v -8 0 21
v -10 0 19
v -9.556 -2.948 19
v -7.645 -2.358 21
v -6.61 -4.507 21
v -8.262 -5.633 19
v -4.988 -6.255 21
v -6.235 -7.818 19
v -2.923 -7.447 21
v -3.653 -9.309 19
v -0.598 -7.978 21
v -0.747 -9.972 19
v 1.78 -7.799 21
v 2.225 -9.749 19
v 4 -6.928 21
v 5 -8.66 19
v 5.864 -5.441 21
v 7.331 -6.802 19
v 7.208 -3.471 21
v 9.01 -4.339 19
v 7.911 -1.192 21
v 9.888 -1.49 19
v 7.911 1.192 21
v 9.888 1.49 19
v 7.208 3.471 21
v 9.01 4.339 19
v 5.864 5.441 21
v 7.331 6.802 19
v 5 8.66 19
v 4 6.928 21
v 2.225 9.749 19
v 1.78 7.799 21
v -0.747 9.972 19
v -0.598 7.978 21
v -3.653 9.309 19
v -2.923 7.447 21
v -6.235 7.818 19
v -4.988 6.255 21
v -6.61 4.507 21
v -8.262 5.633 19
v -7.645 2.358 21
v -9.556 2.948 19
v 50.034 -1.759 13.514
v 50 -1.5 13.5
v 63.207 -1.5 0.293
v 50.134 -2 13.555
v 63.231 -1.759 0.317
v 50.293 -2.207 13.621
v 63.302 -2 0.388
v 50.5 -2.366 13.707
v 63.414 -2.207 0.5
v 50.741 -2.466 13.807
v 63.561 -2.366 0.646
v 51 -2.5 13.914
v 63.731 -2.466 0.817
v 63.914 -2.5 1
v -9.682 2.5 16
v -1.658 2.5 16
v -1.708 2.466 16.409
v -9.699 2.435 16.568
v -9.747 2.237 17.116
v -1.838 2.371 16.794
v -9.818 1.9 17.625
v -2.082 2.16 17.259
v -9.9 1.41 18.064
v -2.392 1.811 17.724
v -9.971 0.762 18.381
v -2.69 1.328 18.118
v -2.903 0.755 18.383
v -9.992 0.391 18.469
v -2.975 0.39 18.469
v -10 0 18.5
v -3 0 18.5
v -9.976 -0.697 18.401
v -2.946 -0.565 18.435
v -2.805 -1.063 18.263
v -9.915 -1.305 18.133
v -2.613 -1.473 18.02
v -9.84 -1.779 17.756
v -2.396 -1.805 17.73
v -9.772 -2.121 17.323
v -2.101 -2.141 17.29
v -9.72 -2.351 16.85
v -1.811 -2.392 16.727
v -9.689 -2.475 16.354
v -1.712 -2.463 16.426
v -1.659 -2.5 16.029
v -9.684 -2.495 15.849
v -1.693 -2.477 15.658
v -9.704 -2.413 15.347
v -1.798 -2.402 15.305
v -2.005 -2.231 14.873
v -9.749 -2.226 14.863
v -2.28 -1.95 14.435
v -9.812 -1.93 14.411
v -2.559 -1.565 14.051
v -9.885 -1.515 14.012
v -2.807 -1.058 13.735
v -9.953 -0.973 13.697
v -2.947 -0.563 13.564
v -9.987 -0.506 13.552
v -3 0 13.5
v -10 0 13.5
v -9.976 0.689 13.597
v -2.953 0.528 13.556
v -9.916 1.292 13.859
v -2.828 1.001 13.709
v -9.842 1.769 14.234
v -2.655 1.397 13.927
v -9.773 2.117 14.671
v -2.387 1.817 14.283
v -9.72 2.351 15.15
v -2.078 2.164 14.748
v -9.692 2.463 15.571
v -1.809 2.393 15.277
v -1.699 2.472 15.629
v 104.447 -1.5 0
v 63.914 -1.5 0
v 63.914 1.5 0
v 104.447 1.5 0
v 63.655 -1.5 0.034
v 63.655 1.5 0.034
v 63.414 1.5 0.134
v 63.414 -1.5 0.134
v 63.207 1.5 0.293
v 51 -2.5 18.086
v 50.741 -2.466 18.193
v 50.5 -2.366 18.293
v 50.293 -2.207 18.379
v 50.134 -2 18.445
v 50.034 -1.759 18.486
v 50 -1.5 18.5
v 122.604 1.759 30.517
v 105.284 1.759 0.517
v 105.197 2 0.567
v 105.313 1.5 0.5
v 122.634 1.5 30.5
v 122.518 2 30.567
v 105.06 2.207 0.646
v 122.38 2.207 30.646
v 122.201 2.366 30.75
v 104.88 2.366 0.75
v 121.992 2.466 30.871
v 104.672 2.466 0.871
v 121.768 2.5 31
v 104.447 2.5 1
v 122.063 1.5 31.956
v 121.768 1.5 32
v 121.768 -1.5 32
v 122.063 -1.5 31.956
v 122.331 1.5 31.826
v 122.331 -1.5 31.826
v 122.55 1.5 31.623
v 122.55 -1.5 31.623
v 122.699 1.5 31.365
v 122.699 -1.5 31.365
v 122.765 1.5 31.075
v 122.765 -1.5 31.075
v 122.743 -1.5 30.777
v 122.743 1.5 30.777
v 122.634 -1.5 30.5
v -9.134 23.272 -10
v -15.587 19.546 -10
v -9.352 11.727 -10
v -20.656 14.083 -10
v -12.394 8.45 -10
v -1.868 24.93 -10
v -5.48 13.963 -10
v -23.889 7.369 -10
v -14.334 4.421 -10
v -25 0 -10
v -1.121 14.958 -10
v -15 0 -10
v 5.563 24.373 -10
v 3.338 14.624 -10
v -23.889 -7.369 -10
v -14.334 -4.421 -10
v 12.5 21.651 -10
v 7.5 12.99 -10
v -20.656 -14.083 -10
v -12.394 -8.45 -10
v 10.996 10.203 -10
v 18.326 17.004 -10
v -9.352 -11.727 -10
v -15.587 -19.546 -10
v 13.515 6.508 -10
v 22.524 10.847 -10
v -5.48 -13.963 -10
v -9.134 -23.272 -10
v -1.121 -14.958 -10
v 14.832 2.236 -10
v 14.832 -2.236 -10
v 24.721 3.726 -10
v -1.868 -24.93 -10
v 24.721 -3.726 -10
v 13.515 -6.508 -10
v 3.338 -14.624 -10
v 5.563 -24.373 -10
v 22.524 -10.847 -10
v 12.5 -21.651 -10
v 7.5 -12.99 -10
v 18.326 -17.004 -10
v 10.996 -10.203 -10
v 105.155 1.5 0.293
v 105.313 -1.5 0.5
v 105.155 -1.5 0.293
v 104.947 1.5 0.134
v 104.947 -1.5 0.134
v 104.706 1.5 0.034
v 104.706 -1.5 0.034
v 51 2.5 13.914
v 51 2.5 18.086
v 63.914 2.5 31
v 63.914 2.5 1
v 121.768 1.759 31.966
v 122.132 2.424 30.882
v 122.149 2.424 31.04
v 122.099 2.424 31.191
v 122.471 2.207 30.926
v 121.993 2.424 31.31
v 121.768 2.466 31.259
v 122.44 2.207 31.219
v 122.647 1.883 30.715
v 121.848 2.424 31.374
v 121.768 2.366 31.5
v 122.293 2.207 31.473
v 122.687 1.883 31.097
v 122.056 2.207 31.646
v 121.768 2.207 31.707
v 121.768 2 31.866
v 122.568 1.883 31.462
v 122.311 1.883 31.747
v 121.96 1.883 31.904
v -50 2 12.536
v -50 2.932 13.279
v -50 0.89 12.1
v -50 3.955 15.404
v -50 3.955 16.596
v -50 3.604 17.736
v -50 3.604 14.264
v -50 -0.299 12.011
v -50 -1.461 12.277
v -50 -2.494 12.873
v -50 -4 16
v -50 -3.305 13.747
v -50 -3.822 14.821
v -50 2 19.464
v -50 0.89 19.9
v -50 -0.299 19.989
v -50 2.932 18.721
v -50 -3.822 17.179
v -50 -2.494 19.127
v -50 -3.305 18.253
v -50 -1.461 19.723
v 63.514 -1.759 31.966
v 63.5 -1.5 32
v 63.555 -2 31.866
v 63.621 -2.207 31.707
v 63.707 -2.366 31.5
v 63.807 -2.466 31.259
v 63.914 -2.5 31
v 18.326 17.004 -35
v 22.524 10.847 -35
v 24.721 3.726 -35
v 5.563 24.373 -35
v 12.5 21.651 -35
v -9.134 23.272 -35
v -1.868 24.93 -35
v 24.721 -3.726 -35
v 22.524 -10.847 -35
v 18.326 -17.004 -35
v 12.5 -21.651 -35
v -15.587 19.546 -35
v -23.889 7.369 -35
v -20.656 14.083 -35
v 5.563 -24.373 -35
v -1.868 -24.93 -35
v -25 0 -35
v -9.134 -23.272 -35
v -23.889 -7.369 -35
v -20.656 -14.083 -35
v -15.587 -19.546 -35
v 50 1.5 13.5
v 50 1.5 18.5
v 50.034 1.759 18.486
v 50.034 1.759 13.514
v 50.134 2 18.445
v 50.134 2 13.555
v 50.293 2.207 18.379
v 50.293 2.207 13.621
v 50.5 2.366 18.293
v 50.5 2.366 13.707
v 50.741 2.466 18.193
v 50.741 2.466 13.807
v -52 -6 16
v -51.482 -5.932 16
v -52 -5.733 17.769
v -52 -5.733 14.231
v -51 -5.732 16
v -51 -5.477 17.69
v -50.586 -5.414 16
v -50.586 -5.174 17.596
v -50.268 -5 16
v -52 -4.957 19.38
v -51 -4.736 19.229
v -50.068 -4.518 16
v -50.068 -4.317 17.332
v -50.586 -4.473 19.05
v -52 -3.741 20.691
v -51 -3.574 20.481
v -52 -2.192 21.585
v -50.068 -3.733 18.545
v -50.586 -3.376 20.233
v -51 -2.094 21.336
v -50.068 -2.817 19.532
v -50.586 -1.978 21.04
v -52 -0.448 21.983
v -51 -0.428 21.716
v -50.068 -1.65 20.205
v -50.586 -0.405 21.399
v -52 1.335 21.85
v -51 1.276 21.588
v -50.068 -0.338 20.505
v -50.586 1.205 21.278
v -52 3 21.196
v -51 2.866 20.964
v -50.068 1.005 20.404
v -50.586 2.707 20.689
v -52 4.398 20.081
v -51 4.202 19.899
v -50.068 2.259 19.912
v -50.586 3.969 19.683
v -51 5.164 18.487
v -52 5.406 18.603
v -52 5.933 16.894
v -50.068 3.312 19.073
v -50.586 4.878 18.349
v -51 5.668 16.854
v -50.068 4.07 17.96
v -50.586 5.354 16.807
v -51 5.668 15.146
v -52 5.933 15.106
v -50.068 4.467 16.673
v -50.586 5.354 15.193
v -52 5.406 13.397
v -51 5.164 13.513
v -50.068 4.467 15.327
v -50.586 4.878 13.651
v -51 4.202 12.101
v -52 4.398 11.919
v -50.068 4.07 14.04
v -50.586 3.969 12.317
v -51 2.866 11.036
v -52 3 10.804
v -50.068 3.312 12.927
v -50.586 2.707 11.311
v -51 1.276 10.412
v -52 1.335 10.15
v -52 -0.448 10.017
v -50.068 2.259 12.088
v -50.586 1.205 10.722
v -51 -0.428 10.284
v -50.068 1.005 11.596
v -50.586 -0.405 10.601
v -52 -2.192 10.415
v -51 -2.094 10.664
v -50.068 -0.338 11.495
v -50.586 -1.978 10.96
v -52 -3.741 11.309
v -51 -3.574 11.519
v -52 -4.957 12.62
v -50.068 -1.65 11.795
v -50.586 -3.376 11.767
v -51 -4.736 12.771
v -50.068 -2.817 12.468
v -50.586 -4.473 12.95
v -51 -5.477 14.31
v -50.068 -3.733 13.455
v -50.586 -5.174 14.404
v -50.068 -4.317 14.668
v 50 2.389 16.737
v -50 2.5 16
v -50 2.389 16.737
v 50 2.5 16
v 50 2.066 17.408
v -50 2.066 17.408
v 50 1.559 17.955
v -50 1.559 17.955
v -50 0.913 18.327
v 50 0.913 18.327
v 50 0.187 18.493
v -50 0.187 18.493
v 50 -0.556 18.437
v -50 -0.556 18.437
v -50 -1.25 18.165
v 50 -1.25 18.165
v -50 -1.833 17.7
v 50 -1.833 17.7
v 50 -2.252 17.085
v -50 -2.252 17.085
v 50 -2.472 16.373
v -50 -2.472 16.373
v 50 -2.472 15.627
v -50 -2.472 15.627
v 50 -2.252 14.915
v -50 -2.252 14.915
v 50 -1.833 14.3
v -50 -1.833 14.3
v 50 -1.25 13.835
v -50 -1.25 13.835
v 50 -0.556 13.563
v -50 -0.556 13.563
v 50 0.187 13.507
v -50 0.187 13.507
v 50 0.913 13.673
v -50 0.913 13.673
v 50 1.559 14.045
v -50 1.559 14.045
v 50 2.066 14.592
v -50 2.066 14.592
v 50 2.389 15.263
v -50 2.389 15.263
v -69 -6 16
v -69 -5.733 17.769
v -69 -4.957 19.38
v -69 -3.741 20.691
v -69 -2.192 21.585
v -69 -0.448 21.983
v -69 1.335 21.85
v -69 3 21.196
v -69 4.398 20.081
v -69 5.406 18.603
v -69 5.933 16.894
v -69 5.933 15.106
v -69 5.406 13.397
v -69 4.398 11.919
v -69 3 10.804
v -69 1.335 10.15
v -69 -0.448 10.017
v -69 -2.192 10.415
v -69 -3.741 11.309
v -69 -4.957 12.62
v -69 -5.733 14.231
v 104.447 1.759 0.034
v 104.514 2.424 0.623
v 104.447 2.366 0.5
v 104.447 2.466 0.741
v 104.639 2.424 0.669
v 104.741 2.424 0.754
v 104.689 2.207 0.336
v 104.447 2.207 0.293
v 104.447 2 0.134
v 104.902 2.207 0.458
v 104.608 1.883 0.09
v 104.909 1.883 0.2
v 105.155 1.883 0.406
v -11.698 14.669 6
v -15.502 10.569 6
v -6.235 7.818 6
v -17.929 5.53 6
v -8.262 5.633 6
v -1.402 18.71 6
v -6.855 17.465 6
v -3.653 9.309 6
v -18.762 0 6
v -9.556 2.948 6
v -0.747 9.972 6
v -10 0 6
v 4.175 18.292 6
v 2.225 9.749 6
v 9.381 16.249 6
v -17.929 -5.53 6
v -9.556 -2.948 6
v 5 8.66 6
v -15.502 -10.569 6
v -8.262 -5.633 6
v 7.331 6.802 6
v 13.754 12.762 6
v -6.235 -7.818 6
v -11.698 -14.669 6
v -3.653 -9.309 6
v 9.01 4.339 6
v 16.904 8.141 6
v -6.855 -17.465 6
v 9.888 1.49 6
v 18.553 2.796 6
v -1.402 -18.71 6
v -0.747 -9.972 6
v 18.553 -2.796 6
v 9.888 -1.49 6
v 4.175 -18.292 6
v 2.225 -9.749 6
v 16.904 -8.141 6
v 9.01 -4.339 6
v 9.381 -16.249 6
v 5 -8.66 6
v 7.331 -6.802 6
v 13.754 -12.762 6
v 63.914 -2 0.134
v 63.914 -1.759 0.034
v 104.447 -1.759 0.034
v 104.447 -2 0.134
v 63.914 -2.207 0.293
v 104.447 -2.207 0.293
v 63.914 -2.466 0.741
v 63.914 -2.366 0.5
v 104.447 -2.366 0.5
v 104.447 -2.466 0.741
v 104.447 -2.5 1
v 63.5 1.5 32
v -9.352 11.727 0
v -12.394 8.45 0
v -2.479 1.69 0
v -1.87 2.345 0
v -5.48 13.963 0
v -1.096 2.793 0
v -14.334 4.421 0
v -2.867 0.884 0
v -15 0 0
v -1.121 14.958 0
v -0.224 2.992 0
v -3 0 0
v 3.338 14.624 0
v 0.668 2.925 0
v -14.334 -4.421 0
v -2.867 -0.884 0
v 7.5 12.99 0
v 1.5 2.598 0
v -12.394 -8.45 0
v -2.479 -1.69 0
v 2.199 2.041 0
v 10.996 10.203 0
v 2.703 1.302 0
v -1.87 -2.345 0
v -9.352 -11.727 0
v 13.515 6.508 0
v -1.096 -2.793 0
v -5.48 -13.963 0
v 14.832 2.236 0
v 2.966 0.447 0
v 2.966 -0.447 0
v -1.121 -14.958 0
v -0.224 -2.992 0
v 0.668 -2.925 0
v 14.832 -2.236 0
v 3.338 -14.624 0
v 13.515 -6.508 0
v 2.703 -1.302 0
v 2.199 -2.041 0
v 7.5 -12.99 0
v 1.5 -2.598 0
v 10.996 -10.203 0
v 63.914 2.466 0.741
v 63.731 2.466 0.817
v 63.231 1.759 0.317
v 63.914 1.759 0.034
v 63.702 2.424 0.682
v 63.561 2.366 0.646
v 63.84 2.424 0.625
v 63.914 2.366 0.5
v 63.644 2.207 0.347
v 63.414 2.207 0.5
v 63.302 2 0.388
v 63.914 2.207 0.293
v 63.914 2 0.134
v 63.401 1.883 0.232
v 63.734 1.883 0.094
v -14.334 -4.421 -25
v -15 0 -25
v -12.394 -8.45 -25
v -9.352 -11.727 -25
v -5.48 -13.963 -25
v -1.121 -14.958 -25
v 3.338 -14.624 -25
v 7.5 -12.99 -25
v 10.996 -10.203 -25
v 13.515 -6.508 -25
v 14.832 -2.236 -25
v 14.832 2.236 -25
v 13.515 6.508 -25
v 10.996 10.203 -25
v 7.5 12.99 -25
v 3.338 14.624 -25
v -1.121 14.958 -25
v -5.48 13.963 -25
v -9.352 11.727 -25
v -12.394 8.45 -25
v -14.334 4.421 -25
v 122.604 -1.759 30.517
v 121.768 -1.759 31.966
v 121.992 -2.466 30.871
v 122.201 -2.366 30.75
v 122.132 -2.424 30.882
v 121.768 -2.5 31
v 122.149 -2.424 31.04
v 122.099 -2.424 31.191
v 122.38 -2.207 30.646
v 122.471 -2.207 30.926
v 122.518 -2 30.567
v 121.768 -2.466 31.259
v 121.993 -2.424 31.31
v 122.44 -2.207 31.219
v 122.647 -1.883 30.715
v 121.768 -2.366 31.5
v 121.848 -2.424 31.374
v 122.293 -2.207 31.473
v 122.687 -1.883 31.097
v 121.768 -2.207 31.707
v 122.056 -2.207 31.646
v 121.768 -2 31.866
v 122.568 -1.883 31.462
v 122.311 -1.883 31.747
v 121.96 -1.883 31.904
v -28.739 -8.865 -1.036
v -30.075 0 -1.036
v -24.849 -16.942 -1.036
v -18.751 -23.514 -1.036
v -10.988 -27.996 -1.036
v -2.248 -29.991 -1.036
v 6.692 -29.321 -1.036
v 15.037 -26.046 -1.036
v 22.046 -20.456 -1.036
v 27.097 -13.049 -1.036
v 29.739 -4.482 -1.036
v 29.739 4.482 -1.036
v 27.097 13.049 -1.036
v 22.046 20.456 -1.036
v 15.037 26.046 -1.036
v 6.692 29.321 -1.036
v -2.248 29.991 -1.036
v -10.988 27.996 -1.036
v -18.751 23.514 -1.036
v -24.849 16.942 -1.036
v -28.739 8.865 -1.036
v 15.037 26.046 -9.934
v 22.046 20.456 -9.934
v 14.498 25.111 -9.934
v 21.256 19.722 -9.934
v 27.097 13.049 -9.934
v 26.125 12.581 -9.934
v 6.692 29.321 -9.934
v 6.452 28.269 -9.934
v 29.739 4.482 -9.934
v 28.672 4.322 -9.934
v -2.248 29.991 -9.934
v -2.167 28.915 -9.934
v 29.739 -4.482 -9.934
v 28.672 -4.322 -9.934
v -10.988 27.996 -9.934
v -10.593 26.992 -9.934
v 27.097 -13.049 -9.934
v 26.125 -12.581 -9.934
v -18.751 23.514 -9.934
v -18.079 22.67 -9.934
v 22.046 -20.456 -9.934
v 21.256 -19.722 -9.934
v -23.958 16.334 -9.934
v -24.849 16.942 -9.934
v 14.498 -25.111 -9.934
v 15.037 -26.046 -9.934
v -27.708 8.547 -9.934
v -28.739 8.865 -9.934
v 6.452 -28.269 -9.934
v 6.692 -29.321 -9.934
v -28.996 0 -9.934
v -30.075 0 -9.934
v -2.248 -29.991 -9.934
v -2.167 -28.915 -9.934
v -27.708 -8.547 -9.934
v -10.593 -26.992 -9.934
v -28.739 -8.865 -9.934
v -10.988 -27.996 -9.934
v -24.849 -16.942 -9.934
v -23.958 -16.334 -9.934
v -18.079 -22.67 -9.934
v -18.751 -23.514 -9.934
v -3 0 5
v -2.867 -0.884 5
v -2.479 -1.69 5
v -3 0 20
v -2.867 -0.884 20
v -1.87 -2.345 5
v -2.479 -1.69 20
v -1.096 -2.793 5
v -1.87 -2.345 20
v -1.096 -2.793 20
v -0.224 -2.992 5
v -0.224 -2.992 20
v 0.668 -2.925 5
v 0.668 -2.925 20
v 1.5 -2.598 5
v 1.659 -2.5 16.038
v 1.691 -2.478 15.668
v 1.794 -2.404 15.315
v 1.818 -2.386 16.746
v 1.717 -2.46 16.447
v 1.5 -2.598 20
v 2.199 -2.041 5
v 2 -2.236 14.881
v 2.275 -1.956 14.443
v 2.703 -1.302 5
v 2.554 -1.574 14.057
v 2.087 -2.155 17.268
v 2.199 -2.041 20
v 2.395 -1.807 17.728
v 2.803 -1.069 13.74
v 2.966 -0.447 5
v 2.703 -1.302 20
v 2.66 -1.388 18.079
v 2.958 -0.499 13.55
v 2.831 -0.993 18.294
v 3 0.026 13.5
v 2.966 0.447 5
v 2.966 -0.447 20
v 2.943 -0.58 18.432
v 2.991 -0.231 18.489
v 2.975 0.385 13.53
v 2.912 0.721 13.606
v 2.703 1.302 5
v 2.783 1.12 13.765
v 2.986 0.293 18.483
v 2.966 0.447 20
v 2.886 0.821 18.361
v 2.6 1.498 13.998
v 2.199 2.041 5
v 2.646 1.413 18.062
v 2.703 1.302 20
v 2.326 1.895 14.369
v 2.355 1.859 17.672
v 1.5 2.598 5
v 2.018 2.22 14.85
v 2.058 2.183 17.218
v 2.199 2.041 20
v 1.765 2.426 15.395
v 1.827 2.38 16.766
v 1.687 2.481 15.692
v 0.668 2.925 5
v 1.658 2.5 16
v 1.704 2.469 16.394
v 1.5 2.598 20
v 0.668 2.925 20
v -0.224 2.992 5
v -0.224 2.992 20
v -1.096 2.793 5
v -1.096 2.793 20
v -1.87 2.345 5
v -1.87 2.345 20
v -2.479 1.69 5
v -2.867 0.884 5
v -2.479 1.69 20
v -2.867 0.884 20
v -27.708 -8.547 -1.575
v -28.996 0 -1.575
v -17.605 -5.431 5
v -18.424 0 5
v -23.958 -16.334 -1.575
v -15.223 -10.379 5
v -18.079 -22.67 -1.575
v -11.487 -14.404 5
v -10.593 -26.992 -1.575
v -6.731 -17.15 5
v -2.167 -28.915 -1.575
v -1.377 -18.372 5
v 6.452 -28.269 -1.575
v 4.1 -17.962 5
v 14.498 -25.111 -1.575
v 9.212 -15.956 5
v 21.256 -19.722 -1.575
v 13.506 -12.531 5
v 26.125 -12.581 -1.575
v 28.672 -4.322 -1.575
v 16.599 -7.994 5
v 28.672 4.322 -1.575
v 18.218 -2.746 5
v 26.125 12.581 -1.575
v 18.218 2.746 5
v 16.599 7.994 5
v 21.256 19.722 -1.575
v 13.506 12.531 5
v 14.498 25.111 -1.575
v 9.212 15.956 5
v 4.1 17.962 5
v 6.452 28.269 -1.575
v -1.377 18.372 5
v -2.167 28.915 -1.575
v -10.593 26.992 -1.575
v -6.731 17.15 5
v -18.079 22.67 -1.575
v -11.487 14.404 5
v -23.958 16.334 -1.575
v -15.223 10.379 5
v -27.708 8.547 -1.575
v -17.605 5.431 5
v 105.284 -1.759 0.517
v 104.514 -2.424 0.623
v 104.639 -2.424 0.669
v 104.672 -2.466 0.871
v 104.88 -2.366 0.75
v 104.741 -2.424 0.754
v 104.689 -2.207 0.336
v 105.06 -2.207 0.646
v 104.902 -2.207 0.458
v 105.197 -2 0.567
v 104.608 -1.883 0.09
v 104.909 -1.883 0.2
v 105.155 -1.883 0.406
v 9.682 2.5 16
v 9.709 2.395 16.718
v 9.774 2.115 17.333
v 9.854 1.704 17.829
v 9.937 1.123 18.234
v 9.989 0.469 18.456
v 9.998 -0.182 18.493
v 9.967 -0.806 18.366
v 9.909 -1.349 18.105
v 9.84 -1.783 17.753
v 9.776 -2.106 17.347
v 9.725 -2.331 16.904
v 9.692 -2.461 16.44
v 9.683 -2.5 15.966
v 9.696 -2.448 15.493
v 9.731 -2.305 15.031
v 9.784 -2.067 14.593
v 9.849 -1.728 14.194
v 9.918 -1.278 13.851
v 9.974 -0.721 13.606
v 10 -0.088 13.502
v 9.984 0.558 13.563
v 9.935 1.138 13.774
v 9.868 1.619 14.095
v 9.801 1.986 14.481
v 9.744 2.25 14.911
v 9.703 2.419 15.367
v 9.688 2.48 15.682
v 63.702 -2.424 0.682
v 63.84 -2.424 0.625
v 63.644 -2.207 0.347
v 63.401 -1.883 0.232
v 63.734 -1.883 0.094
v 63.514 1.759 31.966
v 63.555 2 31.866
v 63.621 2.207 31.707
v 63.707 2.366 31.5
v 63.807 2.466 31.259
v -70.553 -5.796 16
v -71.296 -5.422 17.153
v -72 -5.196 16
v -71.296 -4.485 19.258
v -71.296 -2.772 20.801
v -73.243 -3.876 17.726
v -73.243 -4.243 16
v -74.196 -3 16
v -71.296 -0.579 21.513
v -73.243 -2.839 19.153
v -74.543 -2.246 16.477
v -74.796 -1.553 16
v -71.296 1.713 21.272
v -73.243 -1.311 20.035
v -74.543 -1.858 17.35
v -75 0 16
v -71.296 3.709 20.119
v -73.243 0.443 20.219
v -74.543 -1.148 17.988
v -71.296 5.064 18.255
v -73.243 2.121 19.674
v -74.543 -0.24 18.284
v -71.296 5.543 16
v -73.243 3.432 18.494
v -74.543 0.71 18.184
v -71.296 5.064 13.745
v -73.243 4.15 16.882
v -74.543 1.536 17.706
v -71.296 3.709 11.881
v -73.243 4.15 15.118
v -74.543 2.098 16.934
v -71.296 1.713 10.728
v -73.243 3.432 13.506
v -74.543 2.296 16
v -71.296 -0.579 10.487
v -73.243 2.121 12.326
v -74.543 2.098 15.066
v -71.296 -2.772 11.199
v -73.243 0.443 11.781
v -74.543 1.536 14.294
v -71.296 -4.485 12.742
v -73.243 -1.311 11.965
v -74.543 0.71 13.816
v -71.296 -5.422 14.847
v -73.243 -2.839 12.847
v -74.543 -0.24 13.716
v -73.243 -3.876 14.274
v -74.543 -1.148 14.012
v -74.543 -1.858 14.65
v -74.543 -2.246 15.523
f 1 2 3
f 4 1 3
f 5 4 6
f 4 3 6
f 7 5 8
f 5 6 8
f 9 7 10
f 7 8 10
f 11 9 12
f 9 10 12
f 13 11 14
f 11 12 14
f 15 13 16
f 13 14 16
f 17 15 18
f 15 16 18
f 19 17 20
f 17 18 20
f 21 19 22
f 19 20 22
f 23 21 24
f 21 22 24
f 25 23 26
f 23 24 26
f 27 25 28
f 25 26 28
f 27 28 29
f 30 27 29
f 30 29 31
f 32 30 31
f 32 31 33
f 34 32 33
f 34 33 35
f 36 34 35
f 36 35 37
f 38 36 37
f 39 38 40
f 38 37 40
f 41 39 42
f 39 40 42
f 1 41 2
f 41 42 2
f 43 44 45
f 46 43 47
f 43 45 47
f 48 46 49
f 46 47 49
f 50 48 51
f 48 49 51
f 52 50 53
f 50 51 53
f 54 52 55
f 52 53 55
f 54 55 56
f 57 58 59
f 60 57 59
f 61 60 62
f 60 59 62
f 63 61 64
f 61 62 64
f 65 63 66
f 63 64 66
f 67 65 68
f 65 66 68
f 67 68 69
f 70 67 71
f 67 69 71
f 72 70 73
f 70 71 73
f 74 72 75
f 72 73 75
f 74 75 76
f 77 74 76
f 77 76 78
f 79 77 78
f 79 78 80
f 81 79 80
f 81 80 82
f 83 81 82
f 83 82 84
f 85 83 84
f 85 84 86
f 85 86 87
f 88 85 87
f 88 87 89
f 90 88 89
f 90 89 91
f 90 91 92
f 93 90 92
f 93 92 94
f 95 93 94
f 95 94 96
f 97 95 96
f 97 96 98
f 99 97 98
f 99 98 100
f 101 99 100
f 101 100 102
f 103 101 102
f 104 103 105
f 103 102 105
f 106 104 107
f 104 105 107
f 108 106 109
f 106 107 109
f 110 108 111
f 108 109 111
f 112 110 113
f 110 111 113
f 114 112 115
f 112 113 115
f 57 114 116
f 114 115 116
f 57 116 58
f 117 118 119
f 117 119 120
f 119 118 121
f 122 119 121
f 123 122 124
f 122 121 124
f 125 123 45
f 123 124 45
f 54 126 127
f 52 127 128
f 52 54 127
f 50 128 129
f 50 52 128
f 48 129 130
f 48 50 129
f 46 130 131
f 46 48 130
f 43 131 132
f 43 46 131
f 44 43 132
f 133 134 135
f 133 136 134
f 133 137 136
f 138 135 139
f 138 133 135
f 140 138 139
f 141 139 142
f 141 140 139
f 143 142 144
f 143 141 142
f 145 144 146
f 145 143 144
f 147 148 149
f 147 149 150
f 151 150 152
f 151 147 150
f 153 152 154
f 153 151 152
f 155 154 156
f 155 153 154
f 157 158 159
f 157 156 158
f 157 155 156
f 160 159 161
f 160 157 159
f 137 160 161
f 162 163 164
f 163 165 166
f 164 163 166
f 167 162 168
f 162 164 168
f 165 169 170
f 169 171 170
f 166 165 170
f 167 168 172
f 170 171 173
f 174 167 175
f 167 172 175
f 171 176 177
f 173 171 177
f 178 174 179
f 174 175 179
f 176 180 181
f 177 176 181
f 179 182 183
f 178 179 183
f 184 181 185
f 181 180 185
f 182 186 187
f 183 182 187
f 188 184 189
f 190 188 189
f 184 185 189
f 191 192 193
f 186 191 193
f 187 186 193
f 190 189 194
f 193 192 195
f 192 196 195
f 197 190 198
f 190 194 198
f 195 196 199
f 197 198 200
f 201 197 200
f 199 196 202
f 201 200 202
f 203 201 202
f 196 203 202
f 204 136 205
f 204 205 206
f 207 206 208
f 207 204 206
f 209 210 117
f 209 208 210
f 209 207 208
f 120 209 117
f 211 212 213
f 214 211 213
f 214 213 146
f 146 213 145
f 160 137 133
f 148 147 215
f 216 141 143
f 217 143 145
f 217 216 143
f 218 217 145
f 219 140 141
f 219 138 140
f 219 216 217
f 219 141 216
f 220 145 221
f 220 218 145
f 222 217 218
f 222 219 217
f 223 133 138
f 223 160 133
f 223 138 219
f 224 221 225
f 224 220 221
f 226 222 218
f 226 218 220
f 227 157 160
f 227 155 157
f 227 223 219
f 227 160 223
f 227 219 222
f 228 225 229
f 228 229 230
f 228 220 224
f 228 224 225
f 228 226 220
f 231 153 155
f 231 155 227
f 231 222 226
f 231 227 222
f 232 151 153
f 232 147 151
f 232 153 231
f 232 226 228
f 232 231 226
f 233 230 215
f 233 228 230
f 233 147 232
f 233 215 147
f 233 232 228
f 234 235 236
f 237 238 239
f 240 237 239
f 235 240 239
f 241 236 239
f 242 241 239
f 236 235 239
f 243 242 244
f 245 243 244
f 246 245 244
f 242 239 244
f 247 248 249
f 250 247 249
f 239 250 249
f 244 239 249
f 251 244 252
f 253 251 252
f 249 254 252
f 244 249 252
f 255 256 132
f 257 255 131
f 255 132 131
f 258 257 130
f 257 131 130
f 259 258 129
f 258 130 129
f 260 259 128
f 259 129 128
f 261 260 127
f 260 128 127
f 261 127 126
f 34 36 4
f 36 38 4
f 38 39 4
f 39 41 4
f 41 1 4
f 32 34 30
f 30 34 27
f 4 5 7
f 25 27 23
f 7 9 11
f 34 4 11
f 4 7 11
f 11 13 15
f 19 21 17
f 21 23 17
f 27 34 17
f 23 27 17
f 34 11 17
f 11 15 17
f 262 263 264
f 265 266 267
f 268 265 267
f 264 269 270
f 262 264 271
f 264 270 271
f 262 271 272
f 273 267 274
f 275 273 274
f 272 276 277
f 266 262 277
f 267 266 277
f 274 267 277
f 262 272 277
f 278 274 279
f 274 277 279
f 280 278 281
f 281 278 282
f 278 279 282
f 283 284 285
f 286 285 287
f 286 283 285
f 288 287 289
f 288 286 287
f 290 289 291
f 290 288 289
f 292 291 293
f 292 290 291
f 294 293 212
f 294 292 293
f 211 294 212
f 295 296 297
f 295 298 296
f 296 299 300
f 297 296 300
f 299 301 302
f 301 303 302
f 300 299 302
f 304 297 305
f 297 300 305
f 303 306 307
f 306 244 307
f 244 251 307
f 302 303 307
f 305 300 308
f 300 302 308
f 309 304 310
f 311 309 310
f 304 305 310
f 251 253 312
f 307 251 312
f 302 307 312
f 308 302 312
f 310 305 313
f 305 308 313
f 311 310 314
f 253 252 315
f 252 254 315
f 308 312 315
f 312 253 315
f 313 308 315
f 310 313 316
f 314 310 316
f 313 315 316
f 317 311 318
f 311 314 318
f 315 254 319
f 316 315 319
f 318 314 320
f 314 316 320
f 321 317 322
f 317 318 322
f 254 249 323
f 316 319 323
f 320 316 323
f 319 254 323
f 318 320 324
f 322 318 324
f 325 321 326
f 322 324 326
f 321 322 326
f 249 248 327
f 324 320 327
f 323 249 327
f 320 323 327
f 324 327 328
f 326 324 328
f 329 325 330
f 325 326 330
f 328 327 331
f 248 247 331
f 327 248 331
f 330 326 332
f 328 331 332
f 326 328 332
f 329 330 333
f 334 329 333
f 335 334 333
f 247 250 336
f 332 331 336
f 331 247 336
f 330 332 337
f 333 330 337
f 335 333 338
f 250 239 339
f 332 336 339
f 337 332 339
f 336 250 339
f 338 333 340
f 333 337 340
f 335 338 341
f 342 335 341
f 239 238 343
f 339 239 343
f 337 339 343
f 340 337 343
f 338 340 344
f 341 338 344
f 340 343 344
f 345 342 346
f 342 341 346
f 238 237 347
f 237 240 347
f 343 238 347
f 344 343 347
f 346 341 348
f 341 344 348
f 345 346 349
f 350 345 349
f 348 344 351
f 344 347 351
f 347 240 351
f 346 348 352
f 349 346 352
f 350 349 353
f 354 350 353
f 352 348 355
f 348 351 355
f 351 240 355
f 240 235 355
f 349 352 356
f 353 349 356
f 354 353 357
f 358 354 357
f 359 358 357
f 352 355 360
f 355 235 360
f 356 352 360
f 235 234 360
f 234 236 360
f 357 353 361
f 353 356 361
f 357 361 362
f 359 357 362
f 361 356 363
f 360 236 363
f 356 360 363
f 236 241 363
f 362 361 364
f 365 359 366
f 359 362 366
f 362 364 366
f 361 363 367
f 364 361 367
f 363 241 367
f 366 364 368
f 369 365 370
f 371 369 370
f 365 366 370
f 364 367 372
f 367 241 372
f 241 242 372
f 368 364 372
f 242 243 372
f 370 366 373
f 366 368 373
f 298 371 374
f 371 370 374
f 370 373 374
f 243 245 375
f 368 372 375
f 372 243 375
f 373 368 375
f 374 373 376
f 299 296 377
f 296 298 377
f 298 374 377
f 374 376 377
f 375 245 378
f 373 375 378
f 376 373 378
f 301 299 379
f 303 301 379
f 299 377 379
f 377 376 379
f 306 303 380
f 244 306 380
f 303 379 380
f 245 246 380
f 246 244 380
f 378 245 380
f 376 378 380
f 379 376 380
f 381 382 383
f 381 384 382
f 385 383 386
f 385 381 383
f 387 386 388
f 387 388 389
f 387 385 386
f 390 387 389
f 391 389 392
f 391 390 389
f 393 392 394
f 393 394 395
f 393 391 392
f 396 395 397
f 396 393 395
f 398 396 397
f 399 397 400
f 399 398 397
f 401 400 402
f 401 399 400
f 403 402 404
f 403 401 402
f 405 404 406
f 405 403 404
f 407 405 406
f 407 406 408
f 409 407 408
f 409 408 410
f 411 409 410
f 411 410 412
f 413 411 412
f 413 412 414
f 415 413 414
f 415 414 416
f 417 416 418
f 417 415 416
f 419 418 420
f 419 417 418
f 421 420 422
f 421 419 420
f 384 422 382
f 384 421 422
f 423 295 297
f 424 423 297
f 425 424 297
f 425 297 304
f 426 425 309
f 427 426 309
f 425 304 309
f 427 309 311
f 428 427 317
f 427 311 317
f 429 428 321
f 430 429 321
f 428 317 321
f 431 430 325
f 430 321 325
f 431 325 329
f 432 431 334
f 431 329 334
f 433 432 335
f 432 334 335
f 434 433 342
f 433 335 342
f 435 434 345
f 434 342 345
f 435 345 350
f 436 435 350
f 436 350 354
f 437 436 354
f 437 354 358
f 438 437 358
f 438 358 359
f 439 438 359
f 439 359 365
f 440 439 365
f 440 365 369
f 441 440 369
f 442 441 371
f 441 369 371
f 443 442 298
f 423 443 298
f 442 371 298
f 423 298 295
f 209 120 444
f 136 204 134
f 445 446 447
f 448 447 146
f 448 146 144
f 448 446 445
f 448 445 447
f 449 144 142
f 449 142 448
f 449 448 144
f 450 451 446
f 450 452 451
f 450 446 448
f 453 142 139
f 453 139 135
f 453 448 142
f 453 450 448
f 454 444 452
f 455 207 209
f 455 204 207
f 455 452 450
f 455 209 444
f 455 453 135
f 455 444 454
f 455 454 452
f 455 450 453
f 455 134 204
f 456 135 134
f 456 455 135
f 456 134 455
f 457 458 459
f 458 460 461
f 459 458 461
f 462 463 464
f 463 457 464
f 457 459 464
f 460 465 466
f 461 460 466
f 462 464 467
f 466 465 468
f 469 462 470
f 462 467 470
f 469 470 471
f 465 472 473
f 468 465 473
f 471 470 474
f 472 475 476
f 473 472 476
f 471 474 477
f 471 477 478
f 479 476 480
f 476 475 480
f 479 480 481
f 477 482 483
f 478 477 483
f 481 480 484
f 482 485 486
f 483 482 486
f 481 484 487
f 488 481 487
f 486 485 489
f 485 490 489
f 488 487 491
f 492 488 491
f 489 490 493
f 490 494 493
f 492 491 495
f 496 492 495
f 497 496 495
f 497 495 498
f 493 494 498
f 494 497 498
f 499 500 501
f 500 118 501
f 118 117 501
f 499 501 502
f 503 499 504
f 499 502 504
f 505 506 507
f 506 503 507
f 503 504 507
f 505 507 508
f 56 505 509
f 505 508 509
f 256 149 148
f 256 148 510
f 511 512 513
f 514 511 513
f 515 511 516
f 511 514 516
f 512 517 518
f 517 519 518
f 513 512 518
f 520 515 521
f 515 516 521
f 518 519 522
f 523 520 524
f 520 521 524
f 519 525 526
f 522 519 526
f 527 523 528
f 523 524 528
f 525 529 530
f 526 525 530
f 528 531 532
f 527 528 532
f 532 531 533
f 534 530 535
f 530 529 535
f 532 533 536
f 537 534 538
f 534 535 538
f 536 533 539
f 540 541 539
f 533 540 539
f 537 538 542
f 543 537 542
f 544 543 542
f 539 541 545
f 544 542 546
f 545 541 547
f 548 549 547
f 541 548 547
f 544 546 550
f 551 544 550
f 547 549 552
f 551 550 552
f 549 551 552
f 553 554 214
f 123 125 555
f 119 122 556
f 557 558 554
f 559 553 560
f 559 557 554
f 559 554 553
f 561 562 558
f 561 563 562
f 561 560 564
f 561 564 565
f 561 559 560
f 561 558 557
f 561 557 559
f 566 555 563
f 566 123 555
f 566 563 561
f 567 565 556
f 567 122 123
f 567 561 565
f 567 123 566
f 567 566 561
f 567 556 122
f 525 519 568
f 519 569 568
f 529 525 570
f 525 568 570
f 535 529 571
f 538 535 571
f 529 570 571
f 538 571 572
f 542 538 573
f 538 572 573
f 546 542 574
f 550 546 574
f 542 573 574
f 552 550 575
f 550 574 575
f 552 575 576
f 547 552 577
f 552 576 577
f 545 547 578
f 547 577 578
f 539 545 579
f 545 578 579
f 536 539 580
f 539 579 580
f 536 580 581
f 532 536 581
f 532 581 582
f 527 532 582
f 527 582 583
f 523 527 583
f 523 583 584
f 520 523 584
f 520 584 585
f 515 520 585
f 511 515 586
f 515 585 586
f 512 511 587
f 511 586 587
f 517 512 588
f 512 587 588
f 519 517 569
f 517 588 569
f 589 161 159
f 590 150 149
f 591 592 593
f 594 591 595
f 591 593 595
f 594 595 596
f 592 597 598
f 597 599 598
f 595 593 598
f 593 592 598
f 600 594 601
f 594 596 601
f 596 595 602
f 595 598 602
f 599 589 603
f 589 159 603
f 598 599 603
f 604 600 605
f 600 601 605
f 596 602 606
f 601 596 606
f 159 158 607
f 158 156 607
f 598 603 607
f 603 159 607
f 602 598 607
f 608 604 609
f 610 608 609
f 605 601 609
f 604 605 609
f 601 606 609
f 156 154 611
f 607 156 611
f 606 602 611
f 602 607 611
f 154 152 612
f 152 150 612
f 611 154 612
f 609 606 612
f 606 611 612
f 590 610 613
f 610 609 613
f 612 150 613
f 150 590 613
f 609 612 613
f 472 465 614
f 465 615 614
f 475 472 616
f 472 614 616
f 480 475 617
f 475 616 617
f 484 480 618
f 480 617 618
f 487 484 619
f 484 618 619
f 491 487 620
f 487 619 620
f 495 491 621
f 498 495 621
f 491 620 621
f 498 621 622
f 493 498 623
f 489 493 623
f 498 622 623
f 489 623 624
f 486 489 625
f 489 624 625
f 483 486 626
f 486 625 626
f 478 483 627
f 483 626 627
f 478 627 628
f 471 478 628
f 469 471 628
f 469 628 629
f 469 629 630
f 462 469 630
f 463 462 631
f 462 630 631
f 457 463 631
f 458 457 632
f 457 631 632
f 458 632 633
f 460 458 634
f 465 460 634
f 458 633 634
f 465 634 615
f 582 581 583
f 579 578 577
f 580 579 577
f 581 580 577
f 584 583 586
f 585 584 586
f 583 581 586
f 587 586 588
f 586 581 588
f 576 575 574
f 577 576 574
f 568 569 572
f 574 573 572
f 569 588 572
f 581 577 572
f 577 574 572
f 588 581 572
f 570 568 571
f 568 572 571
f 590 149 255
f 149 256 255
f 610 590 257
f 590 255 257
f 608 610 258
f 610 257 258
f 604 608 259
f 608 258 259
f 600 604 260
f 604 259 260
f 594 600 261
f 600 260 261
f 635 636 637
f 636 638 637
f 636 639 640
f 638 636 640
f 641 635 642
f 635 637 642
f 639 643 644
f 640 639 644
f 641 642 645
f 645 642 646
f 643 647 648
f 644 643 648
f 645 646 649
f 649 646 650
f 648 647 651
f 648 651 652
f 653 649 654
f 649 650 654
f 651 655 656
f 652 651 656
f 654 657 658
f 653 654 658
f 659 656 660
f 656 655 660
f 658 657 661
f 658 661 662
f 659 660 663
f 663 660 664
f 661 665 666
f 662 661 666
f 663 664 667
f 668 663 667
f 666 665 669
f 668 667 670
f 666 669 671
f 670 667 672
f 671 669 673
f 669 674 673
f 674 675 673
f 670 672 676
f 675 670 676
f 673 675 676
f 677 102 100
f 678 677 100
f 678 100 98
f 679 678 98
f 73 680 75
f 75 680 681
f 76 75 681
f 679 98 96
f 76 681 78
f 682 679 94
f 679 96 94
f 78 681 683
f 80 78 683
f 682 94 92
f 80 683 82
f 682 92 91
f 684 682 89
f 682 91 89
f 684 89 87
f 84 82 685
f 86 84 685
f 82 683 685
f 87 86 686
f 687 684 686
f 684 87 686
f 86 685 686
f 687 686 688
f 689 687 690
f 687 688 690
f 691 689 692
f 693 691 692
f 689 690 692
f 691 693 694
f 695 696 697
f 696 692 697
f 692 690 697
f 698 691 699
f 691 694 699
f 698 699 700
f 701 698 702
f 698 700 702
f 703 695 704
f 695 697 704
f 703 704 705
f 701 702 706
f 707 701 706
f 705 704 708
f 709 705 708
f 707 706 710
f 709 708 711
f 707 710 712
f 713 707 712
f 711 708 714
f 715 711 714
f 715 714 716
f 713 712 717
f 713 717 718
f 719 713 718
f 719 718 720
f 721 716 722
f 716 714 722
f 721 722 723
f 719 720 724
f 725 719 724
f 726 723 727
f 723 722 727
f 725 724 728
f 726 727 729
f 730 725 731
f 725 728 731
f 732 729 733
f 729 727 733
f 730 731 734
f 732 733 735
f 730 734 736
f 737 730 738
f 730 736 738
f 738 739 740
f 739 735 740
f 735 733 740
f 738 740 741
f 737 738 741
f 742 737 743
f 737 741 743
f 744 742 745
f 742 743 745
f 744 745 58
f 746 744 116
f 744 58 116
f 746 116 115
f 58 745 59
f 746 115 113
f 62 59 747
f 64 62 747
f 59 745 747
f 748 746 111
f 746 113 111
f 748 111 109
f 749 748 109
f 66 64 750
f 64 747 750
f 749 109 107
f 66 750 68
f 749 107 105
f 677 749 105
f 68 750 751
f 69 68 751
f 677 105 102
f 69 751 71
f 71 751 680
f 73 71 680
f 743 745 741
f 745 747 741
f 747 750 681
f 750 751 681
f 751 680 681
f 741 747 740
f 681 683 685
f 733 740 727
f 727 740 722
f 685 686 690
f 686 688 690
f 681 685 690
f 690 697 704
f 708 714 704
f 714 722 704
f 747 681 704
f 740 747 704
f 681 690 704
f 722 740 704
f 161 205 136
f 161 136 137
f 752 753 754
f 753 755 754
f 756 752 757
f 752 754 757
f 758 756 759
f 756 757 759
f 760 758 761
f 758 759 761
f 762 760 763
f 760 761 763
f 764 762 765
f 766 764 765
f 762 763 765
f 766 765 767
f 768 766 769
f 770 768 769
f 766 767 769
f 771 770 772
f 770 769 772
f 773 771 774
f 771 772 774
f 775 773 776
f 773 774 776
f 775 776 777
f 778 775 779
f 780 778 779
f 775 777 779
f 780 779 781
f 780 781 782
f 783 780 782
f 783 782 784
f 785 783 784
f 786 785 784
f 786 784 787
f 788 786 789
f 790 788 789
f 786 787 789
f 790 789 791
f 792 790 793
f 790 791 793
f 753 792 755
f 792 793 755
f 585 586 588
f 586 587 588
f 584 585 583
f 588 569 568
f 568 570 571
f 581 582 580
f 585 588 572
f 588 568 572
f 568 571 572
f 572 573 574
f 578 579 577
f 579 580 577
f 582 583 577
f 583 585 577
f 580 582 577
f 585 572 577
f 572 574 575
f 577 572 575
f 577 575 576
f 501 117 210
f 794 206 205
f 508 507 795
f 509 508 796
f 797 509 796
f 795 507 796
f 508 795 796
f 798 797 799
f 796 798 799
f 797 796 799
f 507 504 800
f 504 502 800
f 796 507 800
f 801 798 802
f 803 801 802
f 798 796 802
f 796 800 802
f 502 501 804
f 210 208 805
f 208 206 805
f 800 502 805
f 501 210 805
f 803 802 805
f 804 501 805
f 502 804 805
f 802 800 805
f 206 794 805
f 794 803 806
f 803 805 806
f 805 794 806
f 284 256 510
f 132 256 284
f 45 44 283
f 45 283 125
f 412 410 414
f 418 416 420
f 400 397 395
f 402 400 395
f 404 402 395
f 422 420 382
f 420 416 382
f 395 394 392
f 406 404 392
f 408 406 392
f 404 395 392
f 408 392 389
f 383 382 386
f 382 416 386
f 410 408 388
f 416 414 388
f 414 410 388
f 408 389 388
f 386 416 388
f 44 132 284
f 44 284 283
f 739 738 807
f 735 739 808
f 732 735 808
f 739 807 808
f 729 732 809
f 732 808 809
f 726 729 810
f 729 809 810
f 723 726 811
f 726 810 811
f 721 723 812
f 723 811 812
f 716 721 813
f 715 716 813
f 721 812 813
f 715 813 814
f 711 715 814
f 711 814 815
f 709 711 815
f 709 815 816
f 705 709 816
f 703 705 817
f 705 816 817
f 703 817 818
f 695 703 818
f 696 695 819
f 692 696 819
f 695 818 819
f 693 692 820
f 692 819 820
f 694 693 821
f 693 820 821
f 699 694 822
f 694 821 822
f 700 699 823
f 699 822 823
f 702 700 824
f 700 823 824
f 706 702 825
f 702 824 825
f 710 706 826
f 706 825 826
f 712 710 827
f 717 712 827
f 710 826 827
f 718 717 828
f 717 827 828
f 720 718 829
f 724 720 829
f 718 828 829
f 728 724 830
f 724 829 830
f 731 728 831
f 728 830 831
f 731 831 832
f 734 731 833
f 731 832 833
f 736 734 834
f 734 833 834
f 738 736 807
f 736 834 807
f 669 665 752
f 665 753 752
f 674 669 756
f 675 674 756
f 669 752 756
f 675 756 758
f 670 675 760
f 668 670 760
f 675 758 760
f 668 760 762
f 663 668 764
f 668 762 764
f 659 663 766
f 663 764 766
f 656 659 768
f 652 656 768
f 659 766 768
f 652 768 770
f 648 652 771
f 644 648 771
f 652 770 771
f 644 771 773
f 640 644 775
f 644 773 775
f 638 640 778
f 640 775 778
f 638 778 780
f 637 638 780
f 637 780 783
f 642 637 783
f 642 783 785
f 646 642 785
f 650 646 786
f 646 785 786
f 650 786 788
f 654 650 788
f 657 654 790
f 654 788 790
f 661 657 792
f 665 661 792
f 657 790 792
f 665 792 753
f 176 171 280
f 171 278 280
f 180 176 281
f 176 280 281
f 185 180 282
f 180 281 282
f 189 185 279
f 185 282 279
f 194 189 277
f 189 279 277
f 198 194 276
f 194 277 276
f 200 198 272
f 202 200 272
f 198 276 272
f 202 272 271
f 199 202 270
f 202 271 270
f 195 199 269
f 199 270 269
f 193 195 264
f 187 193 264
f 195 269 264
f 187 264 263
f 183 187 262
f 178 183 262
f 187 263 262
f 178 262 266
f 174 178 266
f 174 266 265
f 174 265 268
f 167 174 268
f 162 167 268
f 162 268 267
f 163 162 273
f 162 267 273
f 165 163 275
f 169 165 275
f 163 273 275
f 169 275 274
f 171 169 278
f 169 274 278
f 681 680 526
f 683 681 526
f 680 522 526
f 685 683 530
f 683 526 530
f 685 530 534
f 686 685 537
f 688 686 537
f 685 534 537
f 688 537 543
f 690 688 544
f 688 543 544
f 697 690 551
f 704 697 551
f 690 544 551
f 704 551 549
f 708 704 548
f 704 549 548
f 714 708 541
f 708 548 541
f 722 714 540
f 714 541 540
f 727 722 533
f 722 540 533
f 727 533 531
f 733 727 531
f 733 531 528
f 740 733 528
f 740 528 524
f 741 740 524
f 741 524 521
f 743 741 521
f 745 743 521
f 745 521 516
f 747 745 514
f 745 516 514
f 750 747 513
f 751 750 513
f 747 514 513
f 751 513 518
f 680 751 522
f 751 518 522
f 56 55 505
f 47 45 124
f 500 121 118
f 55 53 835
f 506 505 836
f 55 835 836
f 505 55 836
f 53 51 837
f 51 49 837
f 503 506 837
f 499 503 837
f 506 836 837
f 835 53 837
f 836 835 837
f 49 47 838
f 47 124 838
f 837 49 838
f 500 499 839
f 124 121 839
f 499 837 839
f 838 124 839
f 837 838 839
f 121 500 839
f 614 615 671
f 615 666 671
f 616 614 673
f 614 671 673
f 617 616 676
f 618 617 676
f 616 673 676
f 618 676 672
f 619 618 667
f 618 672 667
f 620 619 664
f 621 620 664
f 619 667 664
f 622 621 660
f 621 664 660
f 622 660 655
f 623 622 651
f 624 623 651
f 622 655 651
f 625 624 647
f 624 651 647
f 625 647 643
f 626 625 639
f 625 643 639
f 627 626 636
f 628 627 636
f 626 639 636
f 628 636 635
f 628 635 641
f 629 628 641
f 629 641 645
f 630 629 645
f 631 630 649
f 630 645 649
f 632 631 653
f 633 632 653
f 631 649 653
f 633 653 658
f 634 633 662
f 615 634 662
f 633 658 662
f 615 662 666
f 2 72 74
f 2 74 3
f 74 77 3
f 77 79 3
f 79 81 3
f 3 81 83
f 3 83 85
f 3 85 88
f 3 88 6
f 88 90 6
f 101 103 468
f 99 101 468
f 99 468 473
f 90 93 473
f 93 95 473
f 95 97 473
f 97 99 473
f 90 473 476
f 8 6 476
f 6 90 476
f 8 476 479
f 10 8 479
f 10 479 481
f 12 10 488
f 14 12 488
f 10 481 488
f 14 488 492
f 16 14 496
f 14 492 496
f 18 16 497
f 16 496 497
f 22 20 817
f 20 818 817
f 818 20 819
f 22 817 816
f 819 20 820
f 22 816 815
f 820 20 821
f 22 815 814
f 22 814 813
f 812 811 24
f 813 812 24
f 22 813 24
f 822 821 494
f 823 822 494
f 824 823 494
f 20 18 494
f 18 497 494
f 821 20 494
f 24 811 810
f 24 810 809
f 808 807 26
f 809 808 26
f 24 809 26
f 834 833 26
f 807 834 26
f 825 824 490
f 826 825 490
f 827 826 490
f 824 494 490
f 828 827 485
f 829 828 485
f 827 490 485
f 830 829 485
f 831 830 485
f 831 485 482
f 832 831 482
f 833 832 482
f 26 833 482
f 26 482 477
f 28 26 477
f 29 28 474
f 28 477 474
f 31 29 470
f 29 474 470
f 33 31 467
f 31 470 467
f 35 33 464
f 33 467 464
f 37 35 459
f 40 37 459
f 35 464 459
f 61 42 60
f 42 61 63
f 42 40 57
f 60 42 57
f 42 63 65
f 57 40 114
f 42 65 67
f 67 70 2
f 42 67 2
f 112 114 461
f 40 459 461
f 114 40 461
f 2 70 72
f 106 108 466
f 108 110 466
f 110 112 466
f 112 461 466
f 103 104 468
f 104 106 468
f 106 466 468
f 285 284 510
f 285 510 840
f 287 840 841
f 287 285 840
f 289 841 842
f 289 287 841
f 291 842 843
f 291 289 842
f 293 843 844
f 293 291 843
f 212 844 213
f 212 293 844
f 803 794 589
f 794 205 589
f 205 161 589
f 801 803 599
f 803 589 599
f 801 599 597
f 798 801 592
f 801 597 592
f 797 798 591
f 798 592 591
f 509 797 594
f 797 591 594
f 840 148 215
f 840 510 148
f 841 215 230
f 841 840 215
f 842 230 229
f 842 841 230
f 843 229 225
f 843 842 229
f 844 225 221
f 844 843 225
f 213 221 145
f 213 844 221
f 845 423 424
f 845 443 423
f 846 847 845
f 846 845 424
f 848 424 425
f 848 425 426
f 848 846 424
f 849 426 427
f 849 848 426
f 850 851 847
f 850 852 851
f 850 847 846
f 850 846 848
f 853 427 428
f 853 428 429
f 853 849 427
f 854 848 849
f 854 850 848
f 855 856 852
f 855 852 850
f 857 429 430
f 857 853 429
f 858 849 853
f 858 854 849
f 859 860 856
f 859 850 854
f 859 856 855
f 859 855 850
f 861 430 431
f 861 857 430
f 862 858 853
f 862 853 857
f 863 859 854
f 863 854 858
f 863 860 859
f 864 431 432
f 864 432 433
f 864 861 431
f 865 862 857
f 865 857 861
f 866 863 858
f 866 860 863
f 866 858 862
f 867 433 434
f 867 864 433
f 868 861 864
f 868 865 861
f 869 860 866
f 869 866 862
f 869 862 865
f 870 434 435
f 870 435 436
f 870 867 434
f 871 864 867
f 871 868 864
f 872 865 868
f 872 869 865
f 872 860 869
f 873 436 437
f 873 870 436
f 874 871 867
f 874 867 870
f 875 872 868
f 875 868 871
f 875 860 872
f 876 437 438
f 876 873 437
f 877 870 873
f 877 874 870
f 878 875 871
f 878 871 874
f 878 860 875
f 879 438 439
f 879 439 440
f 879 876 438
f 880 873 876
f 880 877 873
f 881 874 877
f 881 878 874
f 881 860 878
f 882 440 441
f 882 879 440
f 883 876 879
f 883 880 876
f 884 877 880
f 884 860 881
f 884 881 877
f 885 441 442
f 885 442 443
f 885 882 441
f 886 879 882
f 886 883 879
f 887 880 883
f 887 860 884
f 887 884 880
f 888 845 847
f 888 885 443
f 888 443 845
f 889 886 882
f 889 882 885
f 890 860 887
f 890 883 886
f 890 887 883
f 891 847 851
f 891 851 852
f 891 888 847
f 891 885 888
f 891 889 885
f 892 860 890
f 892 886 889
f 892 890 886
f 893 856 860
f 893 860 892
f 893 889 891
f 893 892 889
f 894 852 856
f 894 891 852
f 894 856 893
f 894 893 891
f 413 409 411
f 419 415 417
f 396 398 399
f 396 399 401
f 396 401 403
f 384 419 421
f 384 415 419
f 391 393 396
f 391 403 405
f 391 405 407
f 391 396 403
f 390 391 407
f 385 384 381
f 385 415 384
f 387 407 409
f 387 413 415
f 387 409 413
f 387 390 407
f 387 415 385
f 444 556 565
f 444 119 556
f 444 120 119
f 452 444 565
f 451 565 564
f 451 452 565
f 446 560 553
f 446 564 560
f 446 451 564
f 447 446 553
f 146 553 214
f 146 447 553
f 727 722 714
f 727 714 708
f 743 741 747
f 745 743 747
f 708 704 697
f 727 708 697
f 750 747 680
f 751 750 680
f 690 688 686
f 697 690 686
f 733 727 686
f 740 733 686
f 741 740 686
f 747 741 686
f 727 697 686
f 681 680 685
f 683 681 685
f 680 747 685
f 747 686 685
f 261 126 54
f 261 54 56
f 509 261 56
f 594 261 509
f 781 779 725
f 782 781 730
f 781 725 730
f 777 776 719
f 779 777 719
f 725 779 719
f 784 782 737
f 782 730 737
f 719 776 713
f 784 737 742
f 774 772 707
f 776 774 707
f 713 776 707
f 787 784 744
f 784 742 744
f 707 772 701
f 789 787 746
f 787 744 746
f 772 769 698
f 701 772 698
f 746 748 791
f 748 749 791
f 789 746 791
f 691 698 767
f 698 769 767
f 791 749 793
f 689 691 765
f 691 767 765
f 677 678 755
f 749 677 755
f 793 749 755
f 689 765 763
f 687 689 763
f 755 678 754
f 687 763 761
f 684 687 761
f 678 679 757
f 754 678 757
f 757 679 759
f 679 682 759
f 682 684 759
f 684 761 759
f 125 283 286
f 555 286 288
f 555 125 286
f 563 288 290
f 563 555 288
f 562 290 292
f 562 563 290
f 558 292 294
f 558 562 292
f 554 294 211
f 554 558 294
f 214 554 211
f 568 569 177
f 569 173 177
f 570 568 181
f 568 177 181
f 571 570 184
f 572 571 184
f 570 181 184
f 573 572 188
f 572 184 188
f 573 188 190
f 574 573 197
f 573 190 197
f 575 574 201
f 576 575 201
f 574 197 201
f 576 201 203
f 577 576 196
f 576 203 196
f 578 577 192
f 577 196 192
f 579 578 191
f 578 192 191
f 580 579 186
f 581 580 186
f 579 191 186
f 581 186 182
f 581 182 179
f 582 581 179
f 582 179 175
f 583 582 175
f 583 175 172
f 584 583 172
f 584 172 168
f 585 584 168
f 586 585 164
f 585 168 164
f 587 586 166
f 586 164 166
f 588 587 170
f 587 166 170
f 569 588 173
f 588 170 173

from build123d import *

# Parameters (mm, degrees)
F5_R      = 2.5
F6_DEPTH  = 50
F8_R      = 6
F9_DEPTH  = 25
F10_R     = 6
F11_R     = 2
F13_DEPTH = 2.5
F14_R     = 1
F15_SIZE  = 2
F16_DEPTH = 12.5


with BuildPart() as f1:
    # F0 (on Front) → F1 (revolve)
    with BuildSketch(Plane.XZ):
        Polygon((-3, 0), (0, 0), (0, 20), (-3, 20), (-3, 6), (-3, 5), align=None)
    revolve(axis=Axis((0, 0, 10), (0, 0, 1)))

    # F0 (on Front) → F2 (revolve)
    with BuildSketch(Plane.XZ):
        Polygon((0, -25), (0, 0), (-3, 0), (-15, 0), (-15, -10), (-15, -25), align=None)
    revolve(axis=Axis((0, 0, 10), (0, 0, 1)))


with BuildPart() as f3:
    # F0 (on Front) → F3 (revolve)
    with BuildSketch(Plane.XZ):
        Polygon((0, -35), (0, -25), (-15, -25), (-15, -10), (-25, -10), (-25, -35), align=None)
    revolve(axis=Axis((0, 0, 10), (0, 0, 1)))


with BuildPart() as f4:
    # F0 (on Front) → F4 (revolve)
    with BuildSketch(Plane.XZ):
        Polygon((-3, 20), (0, 20), (0, 21), (-10, 21), (-10, 6), (-3, 6), align=None)
        Polygon((-18.4238955249, 5), (-3, 5), (-3, 6), (-10, 6), (-18.7623279487, 6), (-30.0749070195, -1.0358732022), (-30.0749070195, -9.9341836239), (-28.9961416274, -9.9341836239), (-28.9961416274, -1.575422154), align=None)
    revolve(axis=Axis((0, 0, 10), (0, 0, 1)))

    # F15
    f15_edges = [f4.edges().sort_by_distance(p)[0] for p in [
        (10, 0, 21),
    ]]
    chamfer(f15_edges, length=F15_SIZE)

    # F5 (on Right) → F16 (cut, symmetric)
    with BuildSketch(Plane.YZ):
        with Locations((0, 16)):
            Circle(F5_R)
    extrude(amount=F16_DEPTH, both=True, mode=Mode.SUBTRACT)


with BuildPart() as f6:
    # F5 (on Right) → F6 (new body, symmetric)
    with BuildSketch(Plane.YZ):
        with Locations((0, 16)):
            Circle(F5_R)
    extrude(amount=F6_DEPTH, both=True)


with BuildPart() as f9:
    # F8 (on offset) → F9 (new body)
    with BuildSketch(Plane(origin=(-50, 0, 0), x_dir=(0, -1, 0), z_dir=(-1, 0, 0))):
        with Locations((0, 16)):
            Circle(F8_R)
    extrude(amount=F9_DEPTH)

    # F10
    f10_edges = [f9.edges().sort_by_distance(p)[0] for p in [
        (-75, 6, 16),
    ]]
    fillet(f10_edges, radius=F10_R)

    # F11
    f11_edges = [f9.edges().sort_by_distance(p)[0] for p in [
        (-50, 6, 16),
    ]]
    fillet(f11_edges, radius=F11_R)


with BuildPart() as f13:
    # F12 (on Front) → F13 (new body, symmetric)
    with BuildSketch(Plane.XZ):
        Polygon((63.5, 32), (50, 18.5), (50, 13.5), (63.5, 0), (105.0247913859, 0), (123.5, 32), align=None)
    extrude(amount=F13_DEPTH, both=True)

    # F14
    f14_edges = [f13.edges().sort_by_distance(p)[0] for p in [
        (56.75, -2.5, 25.25),
        (50, -2.5, 16),
        (56.75, -2.5, 6.75),
        (84.262396, -2.5, 0),
        (114.262396, -2.5, 16),
        (93.5, -2.5, 32),
        (56.75, 2.5, 25.25),
        (50, 2.5, 16),
        (56.75, 2.5, 6.75),
        (84.262396, 2.5, 0),
        (114.262396, 2.5, 16),
        (93.5, 2.5, 32),
        (63.5, 0, 0),
        (123.5, 0, 32),
        (105.024791, 0, 0),
    ]]
    fillet(f14_edges, radius=F14_R)


solid = Compound([f1.part, f3.part, f4.part, f6.part, f9.part, f13.part])
